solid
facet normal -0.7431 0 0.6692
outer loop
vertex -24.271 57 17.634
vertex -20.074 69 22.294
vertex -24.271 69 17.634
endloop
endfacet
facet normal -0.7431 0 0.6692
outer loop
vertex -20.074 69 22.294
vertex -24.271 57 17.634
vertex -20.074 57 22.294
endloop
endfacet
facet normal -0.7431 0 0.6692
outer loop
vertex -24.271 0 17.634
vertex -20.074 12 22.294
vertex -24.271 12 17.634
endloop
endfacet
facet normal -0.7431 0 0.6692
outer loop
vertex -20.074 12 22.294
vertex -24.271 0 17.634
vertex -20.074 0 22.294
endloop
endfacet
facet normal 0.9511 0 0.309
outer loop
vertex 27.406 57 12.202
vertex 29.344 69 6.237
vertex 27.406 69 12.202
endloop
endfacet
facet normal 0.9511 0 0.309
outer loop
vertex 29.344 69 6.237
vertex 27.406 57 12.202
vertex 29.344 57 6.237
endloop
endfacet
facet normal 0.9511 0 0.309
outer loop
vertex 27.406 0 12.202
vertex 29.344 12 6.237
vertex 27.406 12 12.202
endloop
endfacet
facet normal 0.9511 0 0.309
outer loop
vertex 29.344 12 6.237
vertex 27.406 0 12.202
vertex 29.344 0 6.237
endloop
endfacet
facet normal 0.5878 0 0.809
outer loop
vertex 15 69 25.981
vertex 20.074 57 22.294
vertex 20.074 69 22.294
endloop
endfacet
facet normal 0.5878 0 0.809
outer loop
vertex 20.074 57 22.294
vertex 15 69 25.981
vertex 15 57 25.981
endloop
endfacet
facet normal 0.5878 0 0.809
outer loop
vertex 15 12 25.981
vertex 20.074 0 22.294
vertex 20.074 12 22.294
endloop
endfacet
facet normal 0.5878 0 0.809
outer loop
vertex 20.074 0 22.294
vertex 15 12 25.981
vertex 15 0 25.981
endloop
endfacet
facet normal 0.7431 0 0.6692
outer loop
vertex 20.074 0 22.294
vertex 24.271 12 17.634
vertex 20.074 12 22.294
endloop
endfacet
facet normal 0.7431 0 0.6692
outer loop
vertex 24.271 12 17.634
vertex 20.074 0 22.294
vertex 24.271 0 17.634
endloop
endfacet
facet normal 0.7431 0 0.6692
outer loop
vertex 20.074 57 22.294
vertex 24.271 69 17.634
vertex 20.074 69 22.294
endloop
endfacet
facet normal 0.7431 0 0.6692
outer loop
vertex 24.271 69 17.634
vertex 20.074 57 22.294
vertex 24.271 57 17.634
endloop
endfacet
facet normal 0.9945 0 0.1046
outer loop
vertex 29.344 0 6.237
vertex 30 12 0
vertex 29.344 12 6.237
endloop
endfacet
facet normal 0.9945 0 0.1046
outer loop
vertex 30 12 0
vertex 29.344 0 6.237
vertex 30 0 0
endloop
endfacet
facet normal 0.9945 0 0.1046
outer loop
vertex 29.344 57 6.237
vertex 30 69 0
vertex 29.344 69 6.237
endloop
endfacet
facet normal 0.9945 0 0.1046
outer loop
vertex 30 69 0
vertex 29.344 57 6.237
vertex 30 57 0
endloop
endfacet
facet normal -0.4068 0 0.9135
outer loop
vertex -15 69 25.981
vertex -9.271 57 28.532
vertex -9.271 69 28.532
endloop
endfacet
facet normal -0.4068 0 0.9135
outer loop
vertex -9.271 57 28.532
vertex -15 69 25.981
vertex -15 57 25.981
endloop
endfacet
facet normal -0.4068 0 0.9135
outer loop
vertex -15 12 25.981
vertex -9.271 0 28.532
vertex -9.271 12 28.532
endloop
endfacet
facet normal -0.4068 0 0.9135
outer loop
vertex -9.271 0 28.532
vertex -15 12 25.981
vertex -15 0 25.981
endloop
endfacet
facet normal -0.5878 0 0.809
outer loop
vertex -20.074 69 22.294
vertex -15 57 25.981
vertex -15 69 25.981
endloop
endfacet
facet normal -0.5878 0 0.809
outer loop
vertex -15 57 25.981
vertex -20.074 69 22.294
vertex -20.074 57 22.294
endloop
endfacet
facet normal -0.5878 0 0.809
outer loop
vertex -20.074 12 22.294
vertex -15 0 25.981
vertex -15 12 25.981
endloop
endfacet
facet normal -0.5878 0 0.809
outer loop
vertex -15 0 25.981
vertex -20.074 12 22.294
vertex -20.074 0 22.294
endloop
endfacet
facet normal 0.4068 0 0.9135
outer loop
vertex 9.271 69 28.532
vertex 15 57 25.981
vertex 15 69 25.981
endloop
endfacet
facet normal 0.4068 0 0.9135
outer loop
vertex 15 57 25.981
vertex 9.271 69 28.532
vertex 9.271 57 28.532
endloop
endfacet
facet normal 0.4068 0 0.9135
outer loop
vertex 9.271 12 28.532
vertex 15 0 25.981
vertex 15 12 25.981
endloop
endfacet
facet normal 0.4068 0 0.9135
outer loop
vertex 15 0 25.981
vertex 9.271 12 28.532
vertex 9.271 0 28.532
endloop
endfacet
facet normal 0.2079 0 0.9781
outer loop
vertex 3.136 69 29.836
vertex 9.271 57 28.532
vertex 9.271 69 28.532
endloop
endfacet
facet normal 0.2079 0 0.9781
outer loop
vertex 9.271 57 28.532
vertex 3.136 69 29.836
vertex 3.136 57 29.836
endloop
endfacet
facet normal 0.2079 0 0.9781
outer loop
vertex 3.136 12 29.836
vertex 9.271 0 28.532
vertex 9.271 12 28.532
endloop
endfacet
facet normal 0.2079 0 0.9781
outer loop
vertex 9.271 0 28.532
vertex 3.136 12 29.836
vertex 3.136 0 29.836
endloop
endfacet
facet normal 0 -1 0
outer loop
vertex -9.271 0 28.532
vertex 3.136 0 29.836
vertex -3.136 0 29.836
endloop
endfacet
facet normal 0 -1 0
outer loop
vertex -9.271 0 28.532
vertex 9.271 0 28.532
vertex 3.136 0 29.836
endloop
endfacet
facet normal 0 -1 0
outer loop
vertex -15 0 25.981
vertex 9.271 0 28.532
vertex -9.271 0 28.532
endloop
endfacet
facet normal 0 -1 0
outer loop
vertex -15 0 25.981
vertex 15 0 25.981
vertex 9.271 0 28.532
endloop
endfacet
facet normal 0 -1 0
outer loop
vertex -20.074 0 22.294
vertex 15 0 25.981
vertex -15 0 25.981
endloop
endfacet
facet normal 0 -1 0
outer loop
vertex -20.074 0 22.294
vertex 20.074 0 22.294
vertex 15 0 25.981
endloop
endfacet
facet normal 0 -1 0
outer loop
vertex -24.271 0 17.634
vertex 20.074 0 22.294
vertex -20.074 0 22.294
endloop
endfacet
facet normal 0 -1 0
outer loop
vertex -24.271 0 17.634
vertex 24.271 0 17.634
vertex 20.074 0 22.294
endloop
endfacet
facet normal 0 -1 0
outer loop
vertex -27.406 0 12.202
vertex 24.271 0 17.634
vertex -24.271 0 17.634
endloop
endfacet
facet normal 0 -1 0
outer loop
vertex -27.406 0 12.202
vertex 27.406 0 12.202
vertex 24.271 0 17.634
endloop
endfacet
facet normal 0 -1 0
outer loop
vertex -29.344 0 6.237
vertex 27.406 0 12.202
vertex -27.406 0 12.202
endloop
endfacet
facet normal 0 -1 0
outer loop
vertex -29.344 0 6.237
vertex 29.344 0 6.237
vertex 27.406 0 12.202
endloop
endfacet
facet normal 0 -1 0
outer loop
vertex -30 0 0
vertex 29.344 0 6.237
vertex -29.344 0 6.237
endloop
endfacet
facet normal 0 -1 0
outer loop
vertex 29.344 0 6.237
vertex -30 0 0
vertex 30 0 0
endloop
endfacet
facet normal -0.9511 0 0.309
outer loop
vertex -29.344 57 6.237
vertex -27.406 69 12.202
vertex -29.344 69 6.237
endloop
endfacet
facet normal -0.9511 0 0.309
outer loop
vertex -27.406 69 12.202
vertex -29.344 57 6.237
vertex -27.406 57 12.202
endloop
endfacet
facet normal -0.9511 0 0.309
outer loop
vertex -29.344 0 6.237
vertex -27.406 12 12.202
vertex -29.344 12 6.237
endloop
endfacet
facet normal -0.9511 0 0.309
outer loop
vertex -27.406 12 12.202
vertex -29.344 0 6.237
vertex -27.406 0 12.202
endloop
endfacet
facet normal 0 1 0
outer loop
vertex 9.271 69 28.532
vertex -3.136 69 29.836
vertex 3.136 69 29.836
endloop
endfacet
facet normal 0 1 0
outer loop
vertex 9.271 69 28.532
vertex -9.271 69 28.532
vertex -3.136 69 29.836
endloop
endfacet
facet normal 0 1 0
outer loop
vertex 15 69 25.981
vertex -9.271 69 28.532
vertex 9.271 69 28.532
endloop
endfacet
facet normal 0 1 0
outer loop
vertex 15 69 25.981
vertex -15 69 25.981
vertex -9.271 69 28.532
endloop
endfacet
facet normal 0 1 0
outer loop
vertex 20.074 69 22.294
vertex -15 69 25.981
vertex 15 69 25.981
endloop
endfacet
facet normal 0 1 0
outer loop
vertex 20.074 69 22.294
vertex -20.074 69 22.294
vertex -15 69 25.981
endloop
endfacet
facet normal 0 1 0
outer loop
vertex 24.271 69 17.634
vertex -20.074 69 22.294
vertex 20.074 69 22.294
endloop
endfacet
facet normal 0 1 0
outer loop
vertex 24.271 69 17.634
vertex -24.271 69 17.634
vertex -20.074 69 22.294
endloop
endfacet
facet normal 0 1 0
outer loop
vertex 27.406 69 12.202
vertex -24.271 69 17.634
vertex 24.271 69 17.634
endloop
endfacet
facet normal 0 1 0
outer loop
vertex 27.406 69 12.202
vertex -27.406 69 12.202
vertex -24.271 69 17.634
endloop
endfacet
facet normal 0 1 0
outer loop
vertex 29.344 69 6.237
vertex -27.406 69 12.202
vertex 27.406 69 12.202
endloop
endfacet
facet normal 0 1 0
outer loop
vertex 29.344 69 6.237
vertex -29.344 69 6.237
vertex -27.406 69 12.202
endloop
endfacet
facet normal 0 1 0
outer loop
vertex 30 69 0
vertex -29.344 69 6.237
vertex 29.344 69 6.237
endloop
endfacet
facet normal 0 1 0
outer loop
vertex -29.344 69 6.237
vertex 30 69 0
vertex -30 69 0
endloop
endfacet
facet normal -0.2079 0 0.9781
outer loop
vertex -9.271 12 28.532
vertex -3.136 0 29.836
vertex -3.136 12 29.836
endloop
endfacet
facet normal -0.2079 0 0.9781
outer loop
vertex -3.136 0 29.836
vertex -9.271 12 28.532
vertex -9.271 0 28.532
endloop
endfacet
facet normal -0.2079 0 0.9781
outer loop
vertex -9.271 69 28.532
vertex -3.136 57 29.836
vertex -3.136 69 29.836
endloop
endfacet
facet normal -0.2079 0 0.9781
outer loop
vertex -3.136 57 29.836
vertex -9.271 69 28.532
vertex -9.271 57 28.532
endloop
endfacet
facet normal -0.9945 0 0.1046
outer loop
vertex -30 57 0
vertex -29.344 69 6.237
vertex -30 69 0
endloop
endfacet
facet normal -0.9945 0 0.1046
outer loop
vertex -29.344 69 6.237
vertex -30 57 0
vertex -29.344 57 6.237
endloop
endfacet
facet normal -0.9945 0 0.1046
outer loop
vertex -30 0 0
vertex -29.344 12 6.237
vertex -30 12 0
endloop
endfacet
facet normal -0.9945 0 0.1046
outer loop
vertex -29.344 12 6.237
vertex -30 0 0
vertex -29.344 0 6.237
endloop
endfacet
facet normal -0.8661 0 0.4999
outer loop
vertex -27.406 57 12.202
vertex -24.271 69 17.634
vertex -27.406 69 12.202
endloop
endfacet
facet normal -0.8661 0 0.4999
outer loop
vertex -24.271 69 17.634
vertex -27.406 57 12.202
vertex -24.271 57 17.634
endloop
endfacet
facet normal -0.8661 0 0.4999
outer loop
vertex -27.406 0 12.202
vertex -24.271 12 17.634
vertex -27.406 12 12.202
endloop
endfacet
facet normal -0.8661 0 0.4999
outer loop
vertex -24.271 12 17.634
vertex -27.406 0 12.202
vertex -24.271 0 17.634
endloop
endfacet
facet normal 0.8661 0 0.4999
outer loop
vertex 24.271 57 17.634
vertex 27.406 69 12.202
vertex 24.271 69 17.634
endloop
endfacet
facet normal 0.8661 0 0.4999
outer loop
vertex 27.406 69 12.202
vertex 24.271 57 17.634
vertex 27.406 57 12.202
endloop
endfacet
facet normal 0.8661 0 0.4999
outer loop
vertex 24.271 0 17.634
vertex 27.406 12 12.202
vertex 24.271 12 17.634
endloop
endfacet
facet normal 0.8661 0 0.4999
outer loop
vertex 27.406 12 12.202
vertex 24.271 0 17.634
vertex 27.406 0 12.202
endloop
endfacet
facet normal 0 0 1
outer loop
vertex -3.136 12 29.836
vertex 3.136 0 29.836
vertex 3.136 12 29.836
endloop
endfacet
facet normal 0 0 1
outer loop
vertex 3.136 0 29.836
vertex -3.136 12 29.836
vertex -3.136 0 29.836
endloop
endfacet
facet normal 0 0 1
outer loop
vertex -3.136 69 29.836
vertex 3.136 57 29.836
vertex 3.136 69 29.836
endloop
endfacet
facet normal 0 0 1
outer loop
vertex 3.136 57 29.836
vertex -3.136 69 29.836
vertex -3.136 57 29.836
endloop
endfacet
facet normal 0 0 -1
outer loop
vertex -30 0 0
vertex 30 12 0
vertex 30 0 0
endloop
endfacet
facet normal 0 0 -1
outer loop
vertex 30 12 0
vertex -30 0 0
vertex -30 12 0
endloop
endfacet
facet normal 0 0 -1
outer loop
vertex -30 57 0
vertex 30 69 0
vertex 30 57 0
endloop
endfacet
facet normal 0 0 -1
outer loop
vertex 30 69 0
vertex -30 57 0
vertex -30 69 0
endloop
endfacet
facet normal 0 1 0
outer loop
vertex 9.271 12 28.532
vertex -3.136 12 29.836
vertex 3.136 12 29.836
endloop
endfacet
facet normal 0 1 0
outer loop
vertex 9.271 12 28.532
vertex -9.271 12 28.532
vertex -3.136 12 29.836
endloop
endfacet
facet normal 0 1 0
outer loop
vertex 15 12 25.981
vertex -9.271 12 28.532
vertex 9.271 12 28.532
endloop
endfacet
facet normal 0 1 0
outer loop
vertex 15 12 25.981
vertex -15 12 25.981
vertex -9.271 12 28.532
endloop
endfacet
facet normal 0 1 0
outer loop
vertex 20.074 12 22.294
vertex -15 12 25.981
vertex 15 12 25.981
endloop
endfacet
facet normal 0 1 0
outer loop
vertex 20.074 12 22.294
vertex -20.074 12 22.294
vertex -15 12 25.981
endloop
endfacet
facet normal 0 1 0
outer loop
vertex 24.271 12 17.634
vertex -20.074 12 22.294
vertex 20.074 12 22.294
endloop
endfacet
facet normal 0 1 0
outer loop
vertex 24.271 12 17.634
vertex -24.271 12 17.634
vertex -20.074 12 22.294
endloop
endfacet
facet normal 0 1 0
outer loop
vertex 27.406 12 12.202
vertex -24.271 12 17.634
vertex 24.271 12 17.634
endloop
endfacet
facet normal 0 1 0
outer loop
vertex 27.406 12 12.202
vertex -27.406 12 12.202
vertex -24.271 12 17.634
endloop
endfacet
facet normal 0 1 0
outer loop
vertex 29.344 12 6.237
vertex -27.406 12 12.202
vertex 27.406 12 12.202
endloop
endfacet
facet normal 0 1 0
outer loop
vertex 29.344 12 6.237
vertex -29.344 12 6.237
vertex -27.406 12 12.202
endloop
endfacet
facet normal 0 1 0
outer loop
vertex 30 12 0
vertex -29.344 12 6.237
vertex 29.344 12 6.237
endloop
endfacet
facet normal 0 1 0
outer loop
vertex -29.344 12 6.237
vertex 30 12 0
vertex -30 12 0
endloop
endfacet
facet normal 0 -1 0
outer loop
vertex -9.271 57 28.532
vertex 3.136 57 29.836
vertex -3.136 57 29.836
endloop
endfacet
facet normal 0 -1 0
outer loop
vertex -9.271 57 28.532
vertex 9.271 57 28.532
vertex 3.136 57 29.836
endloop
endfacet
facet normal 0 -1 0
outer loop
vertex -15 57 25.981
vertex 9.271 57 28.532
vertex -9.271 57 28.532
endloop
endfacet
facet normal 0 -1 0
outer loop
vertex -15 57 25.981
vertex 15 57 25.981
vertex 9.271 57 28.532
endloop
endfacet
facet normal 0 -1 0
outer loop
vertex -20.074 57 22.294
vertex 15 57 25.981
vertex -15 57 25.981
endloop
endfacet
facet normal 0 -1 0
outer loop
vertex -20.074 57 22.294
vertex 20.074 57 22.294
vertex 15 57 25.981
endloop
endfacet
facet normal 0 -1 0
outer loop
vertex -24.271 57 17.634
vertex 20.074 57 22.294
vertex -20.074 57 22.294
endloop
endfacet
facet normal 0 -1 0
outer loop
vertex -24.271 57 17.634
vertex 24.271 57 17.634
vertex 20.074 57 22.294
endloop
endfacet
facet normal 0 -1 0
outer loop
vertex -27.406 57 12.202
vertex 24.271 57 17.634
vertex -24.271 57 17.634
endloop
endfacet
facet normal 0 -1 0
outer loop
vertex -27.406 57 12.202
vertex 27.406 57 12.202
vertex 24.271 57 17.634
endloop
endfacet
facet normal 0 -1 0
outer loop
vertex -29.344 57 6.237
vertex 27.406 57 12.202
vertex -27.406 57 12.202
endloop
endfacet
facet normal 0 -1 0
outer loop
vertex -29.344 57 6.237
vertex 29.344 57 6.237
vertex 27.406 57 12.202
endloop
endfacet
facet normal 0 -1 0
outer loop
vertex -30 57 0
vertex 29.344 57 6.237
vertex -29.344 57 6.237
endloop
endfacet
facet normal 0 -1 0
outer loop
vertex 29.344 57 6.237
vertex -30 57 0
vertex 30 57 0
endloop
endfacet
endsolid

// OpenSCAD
module vertical_aim(radius = 10, space_between = 20, guard_width = 5) {
    difference() {
        total_width = space_between + (guard_width * 2);
        rotate([270, 0, 0])
            cylinder(r = radius, h = total_width);

        translate([- radius, 0, - radius])
            cube([radius * 2, total_width, radius], center = false);

        rotate([270, 0, 0])
            translate([0, 0, guard_width])
                cylinder(r = radius, h = space_between);
    }
}

vertical_aim(30, 45, 12);
